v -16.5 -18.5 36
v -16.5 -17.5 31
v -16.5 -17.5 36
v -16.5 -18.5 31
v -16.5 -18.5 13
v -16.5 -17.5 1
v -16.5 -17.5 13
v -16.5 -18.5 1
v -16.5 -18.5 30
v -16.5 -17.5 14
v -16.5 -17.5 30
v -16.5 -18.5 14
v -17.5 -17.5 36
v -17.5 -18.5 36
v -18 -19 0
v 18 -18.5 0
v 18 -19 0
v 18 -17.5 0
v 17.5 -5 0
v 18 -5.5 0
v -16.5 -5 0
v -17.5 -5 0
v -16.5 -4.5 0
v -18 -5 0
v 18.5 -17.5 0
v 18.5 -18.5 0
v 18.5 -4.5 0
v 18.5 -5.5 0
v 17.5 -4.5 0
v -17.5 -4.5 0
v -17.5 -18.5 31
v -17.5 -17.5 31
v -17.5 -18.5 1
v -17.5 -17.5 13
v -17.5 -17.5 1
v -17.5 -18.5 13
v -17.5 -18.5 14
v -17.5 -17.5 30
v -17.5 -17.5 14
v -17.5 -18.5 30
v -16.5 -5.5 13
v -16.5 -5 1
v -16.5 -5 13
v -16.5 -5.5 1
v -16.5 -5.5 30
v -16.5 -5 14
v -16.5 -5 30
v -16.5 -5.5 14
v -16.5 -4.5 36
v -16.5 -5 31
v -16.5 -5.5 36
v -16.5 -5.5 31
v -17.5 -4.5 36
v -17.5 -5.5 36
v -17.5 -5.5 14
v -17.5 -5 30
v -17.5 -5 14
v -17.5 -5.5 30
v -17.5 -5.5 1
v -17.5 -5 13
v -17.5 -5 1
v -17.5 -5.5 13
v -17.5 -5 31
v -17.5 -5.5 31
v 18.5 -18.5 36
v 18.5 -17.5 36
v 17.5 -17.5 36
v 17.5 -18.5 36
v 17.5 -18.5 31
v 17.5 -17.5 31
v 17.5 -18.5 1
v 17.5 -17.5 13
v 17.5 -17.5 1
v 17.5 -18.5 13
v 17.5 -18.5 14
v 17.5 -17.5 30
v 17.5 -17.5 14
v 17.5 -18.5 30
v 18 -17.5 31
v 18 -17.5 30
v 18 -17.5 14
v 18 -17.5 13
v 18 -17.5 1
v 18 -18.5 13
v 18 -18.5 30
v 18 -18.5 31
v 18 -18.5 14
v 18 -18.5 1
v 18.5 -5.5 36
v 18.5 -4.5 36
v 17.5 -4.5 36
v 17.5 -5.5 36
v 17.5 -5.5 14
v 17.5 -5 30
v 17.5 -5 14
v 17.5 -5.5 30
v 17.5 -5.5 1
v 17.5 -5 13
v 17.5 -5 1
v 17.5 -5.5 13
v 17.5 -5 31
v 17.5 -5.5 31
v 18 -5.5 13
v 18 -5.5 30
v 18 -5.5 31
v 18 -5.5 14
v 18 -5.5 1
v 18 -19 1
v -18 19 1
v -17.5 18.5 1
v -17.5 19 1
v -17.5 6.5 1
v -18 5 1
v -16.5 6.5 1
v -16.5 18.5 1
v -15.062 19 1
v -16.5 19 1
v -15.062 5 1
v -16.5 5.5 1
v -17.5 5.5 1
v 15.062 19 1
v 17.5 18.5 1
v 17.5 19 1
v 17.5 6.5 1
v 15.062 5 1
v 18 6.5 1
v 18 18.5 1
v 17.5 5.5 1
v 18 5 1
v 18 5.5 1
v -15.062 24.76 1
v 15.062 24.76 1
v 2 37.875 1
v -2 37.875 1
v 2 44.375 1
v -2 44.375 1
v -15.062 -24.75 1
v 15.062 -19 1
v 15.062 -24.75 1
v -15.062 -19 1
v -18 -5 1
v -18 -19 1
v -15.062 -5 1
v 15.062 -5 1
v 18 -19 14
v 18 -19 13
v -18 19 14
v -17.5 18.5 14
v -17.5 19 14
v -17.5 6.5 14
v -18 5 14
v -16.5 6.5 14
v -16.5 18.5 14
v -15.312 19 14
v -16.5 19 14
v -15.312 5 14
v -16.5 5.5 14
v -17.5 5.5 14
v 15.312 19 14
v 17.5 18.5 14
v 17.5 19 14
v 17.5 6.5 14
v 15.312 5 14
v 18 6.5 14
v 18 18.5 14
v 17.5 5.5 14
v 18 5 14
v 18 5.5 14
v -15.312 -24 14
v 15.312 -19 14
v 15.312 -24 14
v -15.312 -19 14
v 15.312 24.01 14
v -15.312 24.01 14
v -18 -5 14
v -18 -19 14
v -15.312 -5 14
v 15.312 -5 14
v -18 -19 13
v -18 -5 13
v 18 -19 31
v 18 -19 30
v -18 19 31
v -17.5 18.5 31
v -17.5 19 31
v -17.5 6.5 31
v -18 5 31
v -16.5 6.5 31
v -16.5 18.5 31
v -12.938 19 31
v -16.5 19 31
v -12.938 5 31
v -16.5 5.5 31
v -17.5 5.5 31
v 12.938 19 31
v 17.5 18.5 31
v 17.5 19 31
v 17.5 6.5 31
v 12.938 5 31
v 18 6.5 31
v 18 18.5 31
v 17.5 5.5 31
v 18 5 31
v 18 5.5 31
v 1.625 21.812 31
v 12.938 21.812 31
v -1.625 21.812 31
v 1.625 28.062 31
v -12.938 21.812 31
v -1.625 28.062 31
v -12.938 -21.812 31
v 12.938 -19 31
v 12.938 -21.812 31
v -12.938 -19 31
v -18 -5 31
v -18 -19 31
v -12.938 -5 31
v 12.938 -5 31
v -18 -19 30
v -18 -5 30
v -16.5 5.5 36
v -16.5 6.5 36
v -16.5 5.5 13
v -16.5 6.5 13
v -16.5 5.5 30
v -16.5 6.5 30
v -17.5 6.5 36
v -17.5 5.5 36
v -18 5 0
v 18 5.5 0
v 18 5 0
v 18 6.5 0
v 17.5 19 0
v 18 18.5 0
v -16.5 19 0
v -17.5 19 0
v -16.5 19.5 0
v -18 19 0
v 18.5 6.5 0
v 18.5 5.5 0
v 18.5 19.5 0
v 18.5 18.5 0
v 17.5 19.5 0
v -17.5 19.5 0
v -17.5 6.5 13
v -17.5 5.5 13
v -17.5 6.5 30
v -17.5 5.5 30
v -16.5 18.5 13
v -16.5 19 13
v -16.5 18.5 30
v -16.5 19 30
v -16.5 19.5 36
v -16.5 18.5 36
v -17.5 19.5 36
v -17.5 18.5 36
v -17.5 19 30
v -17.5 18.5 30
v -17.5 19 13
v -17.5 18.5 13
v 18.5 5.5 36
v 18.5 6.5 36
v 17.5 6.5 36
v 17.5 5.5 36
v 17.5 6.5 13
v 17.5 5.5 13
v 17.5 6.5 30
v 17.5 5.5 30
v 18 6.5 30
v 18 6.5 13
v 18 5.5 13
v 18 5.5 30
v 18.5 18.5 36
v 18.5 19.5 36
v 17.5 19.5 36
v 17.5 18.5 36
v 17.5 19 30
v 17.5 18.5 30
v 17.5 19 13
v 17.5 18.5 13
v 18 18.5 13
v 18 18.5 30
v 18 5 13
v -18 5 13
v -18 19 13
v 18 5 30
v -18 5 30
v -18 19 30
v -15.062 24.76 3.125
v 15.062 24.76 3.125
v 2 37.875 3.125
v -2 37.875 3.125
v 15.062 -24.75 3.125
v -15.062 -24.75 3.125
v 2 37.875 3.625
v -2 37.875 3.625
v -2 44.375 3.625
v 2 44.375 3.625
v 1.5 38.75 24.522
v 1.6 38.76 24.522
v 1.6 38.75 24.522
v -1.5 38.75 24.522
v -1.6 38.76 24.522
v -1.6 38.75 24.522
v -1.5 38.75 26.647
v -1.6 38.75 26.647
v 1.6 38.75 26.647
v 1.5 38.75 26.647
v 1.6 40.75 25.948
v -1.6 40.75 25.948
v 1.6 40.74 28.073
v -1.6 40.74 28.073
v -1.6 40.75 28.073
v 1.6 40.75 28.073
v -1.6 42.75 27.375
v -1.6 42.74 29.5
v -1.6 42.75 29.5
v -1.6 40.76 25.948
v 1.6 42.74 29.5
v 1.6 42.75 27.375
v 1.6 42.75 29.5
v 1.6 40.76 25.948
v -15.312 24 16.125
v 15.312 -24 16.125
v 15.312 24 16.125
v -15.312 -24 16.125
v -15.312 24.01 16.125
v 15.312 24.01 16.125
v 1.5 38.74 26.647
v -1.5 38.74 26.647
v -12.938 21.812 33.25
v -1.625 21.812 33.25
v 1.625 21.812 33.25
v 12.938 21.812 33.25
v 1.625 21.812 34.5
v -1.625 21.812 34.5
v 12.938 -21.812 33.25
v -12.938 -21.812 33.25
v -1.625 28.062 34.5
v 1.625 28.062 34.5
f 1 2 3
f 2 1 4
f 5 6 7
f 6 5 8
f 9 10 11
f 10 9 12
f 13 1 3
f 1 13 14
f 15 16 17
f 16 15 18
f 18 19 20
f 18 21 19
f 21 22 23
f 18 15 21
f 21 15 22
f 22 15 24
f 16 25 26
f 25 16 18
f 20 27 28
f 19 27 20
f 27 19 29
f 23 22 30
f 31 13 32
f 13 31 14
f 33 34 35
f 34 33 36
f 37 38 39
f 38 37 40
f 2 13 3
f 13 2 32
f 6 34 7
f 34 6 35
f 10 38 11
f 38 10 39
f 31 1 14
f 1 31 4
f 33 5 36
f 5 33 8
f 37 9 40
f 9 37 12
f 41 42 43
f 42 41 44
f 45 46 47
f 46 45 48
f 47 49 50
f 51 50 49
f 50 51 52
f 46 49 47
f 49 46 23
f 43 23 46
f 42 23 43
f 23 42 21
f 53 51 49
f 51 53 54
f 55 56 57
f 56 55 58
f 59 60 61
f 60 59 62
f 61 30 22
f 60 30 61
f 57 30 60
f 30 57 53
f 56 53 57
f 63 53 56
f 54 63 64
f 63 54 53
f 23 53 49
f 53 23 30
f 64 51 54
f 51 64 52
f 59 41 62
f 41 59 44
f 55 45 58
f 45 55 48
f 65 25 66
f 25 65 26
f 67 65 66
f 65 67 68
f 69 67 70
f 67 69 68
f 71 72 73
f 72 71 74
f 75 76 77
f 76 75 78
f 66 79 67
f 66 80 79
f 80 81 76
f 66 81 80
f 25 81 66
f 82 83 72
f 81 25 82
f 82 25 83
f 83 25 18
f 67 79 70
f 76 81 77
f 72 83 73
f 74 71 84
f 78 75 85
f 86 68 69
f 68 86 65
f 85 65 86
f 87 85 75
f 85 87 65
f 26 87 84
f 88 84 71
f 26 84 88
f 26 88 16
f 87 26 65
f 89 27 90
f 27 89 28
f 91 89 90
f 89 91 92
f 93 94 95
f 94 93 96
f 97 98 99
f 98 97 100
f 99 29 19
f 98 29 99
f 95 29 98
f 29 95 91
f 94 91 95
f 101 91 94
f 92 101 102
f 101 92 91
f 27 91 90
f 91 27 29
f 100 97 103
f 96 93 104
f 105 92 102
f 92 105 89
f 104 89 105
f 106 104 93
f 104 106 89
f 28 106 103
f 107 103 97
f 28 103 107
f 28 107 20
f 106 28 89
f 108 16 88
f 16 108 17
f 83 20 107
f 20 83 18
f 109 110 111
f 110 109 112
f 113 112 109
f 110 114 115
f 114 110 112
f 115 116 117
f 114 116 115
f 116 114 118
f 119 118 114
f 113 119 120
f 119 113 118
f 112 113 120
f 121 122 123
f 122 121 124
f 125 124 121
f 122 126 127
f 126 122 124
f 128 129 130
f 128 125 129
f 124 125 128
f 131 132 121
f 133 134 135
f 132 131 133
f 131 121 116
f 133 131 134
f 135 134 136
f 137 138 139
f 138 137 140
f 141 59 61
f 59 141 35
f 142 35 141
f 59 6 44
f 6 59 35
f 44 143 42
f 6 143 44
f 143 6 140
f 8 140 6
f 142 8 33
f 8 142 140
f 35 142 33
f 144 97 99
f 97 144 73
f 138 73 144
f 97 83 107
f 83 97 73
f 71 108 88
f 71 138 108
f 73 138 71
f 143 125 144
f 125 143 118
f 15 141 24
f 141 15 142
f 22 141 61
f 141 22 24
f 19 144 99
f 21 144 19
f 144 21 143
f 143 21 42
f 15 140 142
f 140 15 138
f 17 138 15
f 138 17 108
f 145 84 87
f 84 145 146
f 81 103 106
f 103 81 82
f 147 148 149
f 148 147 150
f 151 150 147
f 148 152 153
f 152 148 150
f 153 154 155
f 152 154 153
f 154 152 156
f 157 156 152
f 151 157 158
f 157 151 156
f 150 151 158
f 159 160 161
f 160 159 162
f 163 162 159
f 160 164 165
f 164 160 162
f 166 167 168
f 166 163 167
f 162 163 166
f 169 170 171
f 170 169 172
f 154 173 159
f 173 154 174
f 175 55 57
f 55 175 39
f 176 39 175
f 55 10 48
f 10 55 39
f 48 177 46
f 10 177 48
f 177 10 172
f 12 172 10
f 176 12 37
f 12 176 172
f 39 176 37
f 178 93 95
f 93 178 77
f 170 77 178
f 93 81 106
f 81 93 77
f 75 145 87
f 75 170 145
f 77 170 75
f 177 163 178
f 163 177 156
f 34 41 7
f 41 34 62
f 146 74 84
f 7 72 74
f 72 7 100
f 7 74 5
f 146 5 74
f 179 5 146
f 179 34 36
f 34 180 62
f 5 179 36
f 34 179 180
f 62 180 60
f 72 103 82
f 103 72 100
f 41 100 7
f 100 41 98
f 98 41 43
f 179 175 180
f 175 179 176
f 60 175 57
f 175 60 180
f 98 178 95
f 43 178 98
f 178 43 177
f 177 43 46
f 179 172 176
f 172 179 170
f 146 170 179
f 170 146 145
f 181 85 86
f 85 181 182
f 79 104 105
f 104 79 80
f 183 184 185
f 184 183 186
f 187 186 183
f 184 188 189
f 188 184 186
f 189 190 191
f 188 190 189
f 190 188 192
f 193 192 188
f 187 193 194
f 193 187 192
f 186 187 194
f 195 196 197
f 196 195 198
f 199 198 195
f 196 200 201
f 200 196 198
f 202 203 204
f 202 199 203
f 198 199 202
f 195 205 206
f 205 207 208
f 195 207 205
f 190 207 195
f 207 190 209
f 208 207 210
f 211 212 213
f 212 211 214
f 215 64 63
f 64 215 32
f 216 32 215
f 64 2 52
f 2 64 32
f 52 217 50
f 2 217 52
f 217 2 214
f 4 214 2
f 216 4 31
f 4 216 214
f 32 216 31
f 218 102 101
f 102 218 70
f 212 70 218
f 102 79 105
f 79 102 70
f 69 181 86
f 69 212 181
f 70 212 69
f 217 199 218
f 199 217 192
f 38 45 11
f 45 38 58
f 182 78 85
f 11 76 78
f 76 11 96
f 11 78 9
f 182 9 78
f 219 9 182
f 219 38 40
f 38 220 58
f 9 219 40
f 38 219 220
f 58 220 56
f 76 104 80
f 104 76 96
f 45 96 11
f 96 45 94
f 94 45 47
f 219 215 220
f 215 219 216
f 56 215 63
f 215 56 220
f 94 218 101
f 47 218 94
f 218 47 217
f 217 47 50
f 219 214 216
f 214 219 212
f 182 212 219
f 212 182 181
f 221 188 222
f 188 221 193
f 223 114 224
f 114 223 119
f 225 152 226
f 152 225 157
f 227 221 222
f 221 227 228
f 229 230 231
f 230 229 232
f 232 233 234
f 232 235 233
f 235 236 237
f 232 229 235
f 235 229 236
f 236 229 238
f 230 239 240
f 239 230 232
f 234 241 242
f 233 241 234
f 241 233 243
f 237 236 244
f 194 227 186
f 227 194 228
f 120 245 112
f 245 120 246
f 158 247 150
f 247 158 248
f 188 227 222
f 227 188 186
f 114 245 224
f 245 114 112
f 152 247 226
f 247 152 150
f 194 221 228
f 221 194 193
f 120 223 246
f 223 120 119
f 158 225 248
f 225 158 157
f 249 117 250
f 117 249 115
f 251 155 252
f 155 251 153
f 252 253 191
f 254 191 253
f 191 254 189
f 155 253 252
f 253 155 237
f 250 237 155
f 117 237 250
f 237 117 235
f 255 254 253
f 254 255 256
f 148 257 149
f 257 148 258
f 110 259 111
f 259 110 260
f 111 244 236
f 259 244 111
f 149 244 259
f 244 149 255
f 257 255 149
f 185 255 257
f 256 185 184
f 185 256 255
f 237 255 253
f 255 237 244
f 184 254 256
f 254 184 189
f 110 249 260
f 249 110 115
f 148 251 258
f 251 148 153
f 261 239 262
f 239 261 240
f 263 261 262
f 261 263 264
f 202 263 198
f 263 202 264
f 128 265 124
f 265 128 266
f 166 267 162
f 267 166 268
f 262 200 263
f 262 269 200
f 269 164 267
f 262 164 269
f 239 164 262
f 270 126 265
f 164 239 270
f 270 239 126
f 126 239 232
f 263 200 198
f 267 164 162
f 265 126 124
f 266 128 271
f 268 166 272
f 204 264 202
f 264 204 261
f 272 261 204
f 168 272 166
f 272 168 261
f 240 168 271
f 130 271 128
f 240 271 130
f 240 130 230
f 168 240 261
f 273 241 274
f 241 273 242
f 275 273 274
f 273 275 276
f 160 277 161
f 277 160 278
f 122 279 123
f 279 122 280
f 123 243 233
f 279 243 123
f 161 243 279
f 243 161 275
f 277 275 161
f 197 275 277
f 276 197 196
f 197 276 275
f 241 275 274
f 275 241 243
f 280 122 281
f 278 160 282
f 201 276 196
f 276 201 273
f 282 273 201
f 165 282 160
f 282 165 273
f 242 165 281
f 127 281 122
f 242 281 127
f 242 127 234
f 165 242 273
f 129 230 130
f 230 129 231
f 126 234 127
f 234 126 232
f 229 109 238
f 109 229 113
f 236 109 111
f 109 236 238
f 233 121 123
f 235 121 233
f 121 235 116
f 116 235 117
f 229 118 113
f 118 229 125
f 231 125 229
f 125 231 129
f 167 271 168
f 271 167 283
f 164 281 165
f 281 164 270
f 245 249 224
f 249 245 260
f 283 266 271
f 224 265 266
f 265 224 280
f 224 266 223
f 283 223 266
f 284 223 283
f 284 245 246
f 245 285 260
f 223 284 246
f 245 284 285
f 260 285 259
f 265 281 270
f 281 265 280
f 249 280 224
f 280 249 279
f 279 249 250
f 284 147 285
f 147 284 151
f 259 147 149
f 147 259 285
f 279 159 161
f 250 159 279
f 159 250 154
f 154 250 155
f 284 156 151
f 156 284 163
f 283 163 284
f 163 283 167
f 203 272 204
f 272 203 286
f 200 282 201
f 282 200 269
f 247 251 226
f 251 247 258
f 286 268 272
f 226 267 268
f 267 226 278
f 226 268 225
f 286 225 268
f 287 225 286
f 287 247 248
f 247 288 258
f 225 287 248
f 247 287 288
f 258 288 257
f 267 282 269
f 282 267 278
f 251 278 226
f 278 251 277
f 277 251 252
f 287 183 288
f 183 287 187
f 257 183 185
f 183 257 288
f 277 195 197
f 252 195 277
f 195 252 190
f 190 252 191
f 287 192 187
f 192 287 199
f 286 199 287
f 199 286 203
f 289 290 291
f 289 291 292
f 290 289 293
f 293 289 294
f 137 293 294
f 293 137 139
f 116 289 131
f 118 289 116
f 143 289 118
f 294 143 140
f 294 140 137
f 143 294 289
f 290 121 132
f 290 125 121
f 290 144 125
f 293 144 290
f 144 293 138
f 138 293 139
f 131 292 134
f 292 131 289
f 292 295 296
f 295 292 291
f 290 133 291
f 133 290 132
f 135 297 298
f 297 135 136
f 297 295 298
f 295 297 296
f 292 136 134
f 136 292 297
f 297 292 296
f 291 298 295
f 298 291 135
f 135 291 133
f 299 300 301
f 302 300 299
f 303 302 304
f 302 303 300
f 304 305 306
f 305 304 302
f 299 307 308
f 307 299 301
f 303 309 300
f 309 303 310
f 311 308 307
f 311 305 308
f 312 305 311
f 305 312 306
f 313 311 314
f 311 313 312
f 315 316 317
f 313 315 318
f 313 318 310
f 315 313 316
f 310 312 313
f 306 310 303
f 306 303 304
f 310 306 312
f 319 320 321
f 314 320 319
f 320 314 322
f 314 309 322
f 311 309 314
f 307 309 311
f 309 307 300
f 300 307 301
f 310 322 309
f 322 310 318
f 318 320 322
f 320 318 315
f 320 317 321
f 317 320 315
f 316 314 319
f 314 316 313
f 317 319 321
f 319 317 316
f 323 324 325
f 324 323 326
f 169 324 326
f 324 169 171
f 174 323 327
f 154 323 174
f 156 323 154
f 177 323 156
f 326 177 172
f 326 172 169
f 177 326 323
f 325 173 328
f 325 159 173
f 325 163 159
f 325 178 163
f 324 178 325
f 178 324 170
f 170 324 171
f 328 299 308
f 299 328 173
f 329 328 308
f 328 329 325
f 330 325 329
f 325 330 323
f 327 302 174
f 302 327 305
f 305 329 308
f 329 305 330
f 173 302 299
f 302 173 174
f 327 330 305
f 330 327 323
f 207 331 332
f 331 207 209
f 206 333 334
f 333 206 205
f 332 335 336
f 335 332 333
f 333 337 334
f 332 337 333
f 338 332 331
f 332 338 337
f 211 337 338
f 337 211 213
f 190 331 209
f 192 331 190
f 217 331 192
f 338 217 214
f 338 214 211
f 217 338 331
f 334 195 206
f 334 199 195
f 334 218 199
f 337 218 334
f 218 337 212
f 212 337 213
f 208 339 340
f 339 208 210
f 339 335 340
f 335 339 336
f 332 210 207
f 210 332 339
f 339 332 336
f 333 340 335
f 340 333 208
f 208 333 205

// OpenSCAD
// =============================================================
// MUON DETECTOR SETUP
// =============================================================
//
// IMPORTANT IDEA:
// OpenSCAD does NOT force any real-world unit system.
// 1 OpenSCAD unit = 1 inch
//
// -------------------------------------------------------------
// COORDINATE SYSTEM USED IN THIS MODEL
// -------------------------------------------------------------
// x = length direction (left/right in the side view)
// y = width direction  (into/out of the screen in the side view)
// z = vertical direction (up/down)
//
// Every slab is centered in x and y, and starts at z = 0.
// So a slab with height 2.125 goes from z = 0 up to z = 2.125.
//
// -------------------------------------------------------------
// WHAT THIS FILE CONTAINS
// -------------------------------------------------------------
// 1. A simple 3-shelf rack
// 2. Top detector: slab + PMT
// 3. Bottom detector: slab + flush light tunnel + PMT
// 4. Middle detector: slab + diagonal light tunnel + diagonal PMTs
//
// The middle detector PMTs are still a best-effort 2x2 arrangement,
// because exact side-to-side PMT positions were not provided.
// =============================================================


// -------------------------------------------------------------
// SMALL HELPER VALUE
// -------------------------------------------------------------
// EPS is a tiny length used when making hull()-based shapes.
// If we used a face with exactly zero thickness, OpenSCAD would not
// have a real 3D object to hull together.
// So we use a very tiny thickness instead.
EPS = 0.01;


// -------------------------------------------------------------
// DISPLAY TOGGLES
// -------------------------------------------------------------
// Turn these true/false depending on what you want to see.
SHOW_SHELF = true;
EXPLODED_VIEW = false;   // true = separate the detectors for inspection
SHOW_AXES = false;       // true = show x/y/z guide axes
ROTATE_DETECTORS_90 = true;


// -------------------------------------------------------------
// SHELF DIMENSIONS
// -------------------------------------------------------------
// All numbers below are treated directly as inches.
SHELF_W = 36;
SHELF_D = 14;
SHELF_H = 36;
SHELF_THICK = 1;
POST_SIZE = 1;

// Shelf z-heights.
// These are the heights of the shelf BOARDS themselves.
// The actual detectors sit on top of those boards.
SHELF_ZS = [0, 13, 30];


// -------------------------------------------------------------
// TOP DETECTOR DIMENSIONS
// -------------------------------------------------------------
TOP_SLAB_L = 43.625;
TOP_SLAB_W = 25.875;
TOP_SLAB_H = 2.25;

TOP_PMT_L = 6.25;
TOP_PMT_W = 3.25;
TOP_PMT_H = 3.5;


// -------------------------------------------------------------
// BOTTOM DETECTOR DIMENSIONS
// -------------------------------------------------------------
BOT_SLAB_L = 49.5;
BOT_SLAB_W = 30.125;
BOT_SLAB_H = 2.125;

BOT_GUIDE_L = 13.125;
BOT_GUIDE_W1 = 30.125;
BOT_GUIDE_W2 = 4.0;
BOT_GUIDE_H = 2.125;
BOT_GUIDE_RISE = 0.0;   // guide stays flush with slab, so no upward rise

BOT_PMT_L = 6.5;
BOT_PMT_W = 4.0;
BOT_PMT_H = 2.625;


// -------------------------------------------------------------
// MIDDLE DETECTOR DIMENSIONS
// -------------------------------------------------------------
MID_SLAB_L = 48.0;
MID_SLAB_W = 30.625;
MID_SLAB_H = 2.125;

MID_GUIDE_L = 14.75;
MID_GUIDE_W1 = 30.625;
MID_GUIDE_W2 = 3;
MID_GUIDE_H = 2.125;

MID_PMT_L = 2;
MID_PMT_W = 1.6;
MID_PMT_H = 2.125;
MID_PMT_GAP_Y = 0.0;

// You asked for the middle add-on assembly to reach a total height of 15.5 in.
// Here that means:
//   from z = 0 at the bottom of the slab/guide
//   up to the highest point of the outermost PMT
MID_TOTAL_HEIGHT = 15.5;

// The guide and PMTs all follow the same slope.
// The sloped run goes across:
//   guide length + first PMT length + second PMT length
MID_TOTAL_RUN = MID_GUIDE_L + 2 * MID_PMT_L;

// Since the PMT thickness itself is 2.125, the bottom surface must rise by:
//   total desired top height - PMT thickness
MID_TOTAL_RISE = MID_TOTAL_HEIGHT - MID_PMT_H;

// Rise per inch of horizontal run
MID_SLOPE_PER_IN = MID_TOTAL_RISE / MID_TOTAL_RUN;

// Rise from the start of the guide to the end of the guide
MID_GUIDE_RISE = MID_GUIDE_L * MID_SLOPE_PER_IN;

// Rise across one PMT length
MID_PMT_RISE = MID_PMT_L * MID_SLOPE_PER_IN;


// =============================================================
// BASIC BUILDING BLOCK MODULES
// =============================================================

// -------------------------------------------------------------
// centered_box_xy(l, w, h)
// -------------------------------------------------------------
// Makes a rectangular box centered in x and y.
// z starts at 0.
//
// So:
//   x goes from -l/2 to +l/2
//   y goes from -w/2 to +w/2
//   z goes from 0 to h
module centered_box_xy(l, w, h) {
    translate([-l/2, -w/2, 0])
        cube([l, w, h]);
}


// A slab is just a centered box.
module slab_body(l, w, h) {
    centered_box_xy(l, w, h);
}


// -------------------------------------------------------------
// pmt_block(l, w, h, x_start, z_start, y_center)
// -------------------------------------------------------------
// Makes a simple rectangular PMT block.
//
// x_start = where the PMT begins in x
// z_start = where the PMT bottom begins in z
// y_center = centerline of the PMT in y
module pmt_block(l, w, h, x_start, z_start, y_center = 0) {
    translate([x_start, y_center - w/2, z_start])
        cube([l, w, h]);
}
//

// -------------------------------------------------------------
// side_attached_constant_thickness_guide(...)
// -------------------------------------------------------------
// This makes the light tunnel / trapezoid.
//
// It uses hull() between two thin rectangular end faces:
// - the first face is the wide face attached to the slab
// - the second face is the narrow face at the outer end
//
// If rise = 0, the guide is flat and flush.
// If rise > 0, the guide slopes upward as it goes outward.
module side_attached_constant_thickness_guide(
    l,
    w1,
    w2,
    thickness,
    rise,
    x_attach,
    z_base_start = 0
) {
    hull() {
        // Wide face where the guide touches the slab
        translate([x_attach, -w1/2, z_base_start])
            cube([EPS, w1, thickness]);

        // Narrow outer face, shifted upward by "rise"
        translate([x_attach + l - EPS, -w2/2, z_base_start + rise])
            cube([EPS, w2, thickness]);
    }
}


// -------------------------------------------------------------
// oblique_pmt_same_as_guide(...)
// -------------------------------------------------------------
// This makes a PMT the same way the guide is made.
//
// Why do it this way?
// Because simply rotating a rectangular PMT looked wrong in the side view.
// Building it with hull() keeps it visually aligned with the guide.
module oblique_pmt_same_as_guide(
    l,
    w,
    h,
    rise,
    x_start,
    z_start,
    y_center = 0
) {
    hull() {
        // Starting PMT face
        translate([x_start, y_center - w/2, z_start])
            cube([EPS, w, h]);

        // Ending PMT face, moved upward by "rise"
        translate([x_start + l - EPS, y_center - w/2, z_start + rise])
            cube([EPS, w, h]);
    }
}


// -------------------------------------------------------------
// axes(len)
// -------------------------------------------------------------
// Optional helper axes to understand orientation.
module axes(len = 8) {
    color("red")   cube([len, 0.15, 0.15]);
    color("green") cube([0.15, len, 0.15]);
    color("blue")  cube([0.15, 0.15, len]);
}


// =============================================================
// SHELF MODULE
// =============================================================

module shelf_unit() {
    color("silver") {

        // Four vertical corner posts
        for (xsign = [-1, 1], ysign = [-1, 1]) {
            translate([
                xsign * (SHELF_W/2 - POST_SIZE/2),
                ysign * (SHELF_D/2 - POST_SIZE/2),
                0
            ])
                cube([POST_SIZE, POST_SIZE, SHELF_H]);
        }

        // Three shelf boards
        for (z0 = SHELF_ZS) {
            translate([-SHELF_W/2, -SHELF_D/2, z0])
                cube([SHELF_W, SHELF_D, SHELF_THICK]);
        }
    }
}


// =============================================================
// ORIENTATION HELPER
// =============================================================

// This rotates each detector assembly by 90 degrees in the x-y plane.
// If you set ROTATE_DETECTORS_90 = false, the detectors go back to their
// unrotated orientation.
module maybe_rotate_detector() {
    if (ROTATE_DETECTORS_90)
        rotate([0, 0, 90]) children();
    else
        children();
}


// =============================================================
// DETECTOR ASSEMBLIES
// =============================================================

// -------------------------------------------------------------
// TOP DETECTOR
// -------------------------------------------------------------
module top_slab_assembly() {
    maybe_rotate_detector() {

        // Top slab
        color([0.2, 0.55, 0.95, 0.65])
            slab_body(TOP_SLAB_L, TOP_SLAB_W, TOP_SLAB_H);

        // Top PMT
        // Starts at the slab edge in +x direction.
        // Bottom of PMT is flush with bottom of slab (z = 0).
        color([0.22, 0.22, 0.22, 0.95])
            pmt_block(
                TOP_PMT_L,
                TOP_PMT_W,
                TOP_PMT_H,
                TOP_SLAB_L / 2,
                0,
                0
            );
    }
}


// -------------------------------------------------------------
// BOTTOM DETECTOR
// -------------------------------------------------------------
module bottom_slab_assembly() {
    maybe_rotate_detector() {

        // Bottom slab
        color([0.15, 0.70, 0.80, 0.65])
            slab_body(BOT_SLAB_L, BOT_SLAB_W, BOT_SLAB_H);

        // Bottom guide / light tunnel
        // This is attached at the slab edge and stays flush with the slab.
        color([0.70, 0.70, 0.75, 0.90])
            side_attached_constant_thickness_guide(
                BOT_GUIDE_L,
                BOT_GUIDE_W1,
                BOT_GUIDE_W2,
                BOT_GUIDE_H,
                BOT_GUIDE_RISE,
                BOT_SLAB_L / 2,
                0
            );

        // Bottom PMT
        // Starts at the outer end of the guide.
        // PMT bottom is flush with guide bottom.
        color([0.22, 0.22, 0.22, 0.95])
            pmt_block(
                BOT_PMT_L,
                BOT_PMT_W,
                BOT_PMT_H,
                BOT_SLAB_L / 2 + BOT_GUIDE_L,
                0,
                0
            );
    }
}


// -------------------------------------------------------------
// MIDDLE DETECTOR
// -------------------------------------------------------------
module middle_slab_assembly() {
    maybe_rotate_detector() {

        // Middle slab
        color([0.25, 0.82, 0.55, 0.65])
            slab_body(MID_SLAB_L, MID_SLAB_W, MID_SLAB_H);

        // Middle guide / light tunnel
        // This one slopes upward and has constant thickness.
        color([0.78, 0.78, 0.83, 0.90])
            side_attached_constant_thickness_guide(
                MID_GUIDE_L,
                MID_GUIDE_W1,
                MID_GUIDE_W2,
                MID_GUIDE_H,
                MID_GUIDE_RISE,
                MID_SLAB_L / 2,
                0
            );

        // Where the guide ends in x and z.
        // The PMTs begin exactly there.
        x_front = MID_SLAB_L / 2 + MID_GUIDE_L;
        z_front = MID_GUIDE_RISE;

        // Two PMTs in +y / -y for the first row
        y_top =  MID_PMT_W / 2 + MID_PMT_GAP_Y / 2;
        y_bot = -MID_PMT_W / 2 - MID_PMT_GAP_Y / 2;

        // Middle PMTs
        // Built the same way as the guide so they point the same direction.
        // Current layout = 2x2 cluster, best estimate.
        color([0.18, 0.18, 0.18, 0.95]) {

            // First pair of PMTs, starting directly at the guide exit
            oblique_pmt_same_as_guide(
                MID_PMT_L, MID_PMT_W, MID_PMT_H,
                MID_PMT_RISE,
                x_front, z_front, y_top
            );

            oblique_pmt_same_as_guide(
                MID_PMT_L, MID_PMT_W, MID_PMT_H,
                MID_PMT_RISE,
                x_front, z_front, y_bot
            );

            // Second pair of PMTs, continuing the same slope farther outward
            oblique_pmt_same_as_guide(
                MID_PMT_L, MID_PMT_W, MID_PMT_H,
                MID_PMT_RISE,
                x_front + MID_PMT_L,
                z_front + MID_PMT_RISE,
                y_top
            );

            oblique_pmt_same_as_guide(
                MID_PMT_L, MID_PMT_W, MID_PMT_H,
                MID_PMT_RISE,
                x_front + MID_PMT_L,
                z_front + MID_PMT_RISE,
                y_bot
            );
        }
    }
}


// =============================================================
// WHOLE-SCENE LAYOUT
// =============================================================

// Exploded view: detectors spread apart so you can inspect them individually.
module exploded_layout() {
    dx = 85;

    translate([-dx, 0, 0]) bottom_slab_assembly();
    middle_slab_assembly();
    translate([ dx, 0, 0]) top_slab_assembly();
}


//

// Shelf view: detectors placed on the 3 shelves.
module shelf_layout() {

    if (SHOW_SHELF)
        translate([0,-12,0]) shelf_unit();
        translate([0,12,0]) shelf_unit();

    // Put each detector on top of its shelf board.
    translate([0, 0, SHELF_ZS[0] + SHELF_THICK]) bottom_slab_assembly();
    translate([0, 0, SHELF_ZS[1] + SHELF_THICK]) middle_slab_assembly();
    translate([0, 0, SHELF_ZS[2] + SHELF_THICK]) top_slab_assembly();
}


// =============================================================
// FINAL DRAW CALLS
// =============================================================

if (SHOW_AXES)
    axes();

if (EXPLODED_VIEW)
    exploded_layout();
else
    shelf_layout();
